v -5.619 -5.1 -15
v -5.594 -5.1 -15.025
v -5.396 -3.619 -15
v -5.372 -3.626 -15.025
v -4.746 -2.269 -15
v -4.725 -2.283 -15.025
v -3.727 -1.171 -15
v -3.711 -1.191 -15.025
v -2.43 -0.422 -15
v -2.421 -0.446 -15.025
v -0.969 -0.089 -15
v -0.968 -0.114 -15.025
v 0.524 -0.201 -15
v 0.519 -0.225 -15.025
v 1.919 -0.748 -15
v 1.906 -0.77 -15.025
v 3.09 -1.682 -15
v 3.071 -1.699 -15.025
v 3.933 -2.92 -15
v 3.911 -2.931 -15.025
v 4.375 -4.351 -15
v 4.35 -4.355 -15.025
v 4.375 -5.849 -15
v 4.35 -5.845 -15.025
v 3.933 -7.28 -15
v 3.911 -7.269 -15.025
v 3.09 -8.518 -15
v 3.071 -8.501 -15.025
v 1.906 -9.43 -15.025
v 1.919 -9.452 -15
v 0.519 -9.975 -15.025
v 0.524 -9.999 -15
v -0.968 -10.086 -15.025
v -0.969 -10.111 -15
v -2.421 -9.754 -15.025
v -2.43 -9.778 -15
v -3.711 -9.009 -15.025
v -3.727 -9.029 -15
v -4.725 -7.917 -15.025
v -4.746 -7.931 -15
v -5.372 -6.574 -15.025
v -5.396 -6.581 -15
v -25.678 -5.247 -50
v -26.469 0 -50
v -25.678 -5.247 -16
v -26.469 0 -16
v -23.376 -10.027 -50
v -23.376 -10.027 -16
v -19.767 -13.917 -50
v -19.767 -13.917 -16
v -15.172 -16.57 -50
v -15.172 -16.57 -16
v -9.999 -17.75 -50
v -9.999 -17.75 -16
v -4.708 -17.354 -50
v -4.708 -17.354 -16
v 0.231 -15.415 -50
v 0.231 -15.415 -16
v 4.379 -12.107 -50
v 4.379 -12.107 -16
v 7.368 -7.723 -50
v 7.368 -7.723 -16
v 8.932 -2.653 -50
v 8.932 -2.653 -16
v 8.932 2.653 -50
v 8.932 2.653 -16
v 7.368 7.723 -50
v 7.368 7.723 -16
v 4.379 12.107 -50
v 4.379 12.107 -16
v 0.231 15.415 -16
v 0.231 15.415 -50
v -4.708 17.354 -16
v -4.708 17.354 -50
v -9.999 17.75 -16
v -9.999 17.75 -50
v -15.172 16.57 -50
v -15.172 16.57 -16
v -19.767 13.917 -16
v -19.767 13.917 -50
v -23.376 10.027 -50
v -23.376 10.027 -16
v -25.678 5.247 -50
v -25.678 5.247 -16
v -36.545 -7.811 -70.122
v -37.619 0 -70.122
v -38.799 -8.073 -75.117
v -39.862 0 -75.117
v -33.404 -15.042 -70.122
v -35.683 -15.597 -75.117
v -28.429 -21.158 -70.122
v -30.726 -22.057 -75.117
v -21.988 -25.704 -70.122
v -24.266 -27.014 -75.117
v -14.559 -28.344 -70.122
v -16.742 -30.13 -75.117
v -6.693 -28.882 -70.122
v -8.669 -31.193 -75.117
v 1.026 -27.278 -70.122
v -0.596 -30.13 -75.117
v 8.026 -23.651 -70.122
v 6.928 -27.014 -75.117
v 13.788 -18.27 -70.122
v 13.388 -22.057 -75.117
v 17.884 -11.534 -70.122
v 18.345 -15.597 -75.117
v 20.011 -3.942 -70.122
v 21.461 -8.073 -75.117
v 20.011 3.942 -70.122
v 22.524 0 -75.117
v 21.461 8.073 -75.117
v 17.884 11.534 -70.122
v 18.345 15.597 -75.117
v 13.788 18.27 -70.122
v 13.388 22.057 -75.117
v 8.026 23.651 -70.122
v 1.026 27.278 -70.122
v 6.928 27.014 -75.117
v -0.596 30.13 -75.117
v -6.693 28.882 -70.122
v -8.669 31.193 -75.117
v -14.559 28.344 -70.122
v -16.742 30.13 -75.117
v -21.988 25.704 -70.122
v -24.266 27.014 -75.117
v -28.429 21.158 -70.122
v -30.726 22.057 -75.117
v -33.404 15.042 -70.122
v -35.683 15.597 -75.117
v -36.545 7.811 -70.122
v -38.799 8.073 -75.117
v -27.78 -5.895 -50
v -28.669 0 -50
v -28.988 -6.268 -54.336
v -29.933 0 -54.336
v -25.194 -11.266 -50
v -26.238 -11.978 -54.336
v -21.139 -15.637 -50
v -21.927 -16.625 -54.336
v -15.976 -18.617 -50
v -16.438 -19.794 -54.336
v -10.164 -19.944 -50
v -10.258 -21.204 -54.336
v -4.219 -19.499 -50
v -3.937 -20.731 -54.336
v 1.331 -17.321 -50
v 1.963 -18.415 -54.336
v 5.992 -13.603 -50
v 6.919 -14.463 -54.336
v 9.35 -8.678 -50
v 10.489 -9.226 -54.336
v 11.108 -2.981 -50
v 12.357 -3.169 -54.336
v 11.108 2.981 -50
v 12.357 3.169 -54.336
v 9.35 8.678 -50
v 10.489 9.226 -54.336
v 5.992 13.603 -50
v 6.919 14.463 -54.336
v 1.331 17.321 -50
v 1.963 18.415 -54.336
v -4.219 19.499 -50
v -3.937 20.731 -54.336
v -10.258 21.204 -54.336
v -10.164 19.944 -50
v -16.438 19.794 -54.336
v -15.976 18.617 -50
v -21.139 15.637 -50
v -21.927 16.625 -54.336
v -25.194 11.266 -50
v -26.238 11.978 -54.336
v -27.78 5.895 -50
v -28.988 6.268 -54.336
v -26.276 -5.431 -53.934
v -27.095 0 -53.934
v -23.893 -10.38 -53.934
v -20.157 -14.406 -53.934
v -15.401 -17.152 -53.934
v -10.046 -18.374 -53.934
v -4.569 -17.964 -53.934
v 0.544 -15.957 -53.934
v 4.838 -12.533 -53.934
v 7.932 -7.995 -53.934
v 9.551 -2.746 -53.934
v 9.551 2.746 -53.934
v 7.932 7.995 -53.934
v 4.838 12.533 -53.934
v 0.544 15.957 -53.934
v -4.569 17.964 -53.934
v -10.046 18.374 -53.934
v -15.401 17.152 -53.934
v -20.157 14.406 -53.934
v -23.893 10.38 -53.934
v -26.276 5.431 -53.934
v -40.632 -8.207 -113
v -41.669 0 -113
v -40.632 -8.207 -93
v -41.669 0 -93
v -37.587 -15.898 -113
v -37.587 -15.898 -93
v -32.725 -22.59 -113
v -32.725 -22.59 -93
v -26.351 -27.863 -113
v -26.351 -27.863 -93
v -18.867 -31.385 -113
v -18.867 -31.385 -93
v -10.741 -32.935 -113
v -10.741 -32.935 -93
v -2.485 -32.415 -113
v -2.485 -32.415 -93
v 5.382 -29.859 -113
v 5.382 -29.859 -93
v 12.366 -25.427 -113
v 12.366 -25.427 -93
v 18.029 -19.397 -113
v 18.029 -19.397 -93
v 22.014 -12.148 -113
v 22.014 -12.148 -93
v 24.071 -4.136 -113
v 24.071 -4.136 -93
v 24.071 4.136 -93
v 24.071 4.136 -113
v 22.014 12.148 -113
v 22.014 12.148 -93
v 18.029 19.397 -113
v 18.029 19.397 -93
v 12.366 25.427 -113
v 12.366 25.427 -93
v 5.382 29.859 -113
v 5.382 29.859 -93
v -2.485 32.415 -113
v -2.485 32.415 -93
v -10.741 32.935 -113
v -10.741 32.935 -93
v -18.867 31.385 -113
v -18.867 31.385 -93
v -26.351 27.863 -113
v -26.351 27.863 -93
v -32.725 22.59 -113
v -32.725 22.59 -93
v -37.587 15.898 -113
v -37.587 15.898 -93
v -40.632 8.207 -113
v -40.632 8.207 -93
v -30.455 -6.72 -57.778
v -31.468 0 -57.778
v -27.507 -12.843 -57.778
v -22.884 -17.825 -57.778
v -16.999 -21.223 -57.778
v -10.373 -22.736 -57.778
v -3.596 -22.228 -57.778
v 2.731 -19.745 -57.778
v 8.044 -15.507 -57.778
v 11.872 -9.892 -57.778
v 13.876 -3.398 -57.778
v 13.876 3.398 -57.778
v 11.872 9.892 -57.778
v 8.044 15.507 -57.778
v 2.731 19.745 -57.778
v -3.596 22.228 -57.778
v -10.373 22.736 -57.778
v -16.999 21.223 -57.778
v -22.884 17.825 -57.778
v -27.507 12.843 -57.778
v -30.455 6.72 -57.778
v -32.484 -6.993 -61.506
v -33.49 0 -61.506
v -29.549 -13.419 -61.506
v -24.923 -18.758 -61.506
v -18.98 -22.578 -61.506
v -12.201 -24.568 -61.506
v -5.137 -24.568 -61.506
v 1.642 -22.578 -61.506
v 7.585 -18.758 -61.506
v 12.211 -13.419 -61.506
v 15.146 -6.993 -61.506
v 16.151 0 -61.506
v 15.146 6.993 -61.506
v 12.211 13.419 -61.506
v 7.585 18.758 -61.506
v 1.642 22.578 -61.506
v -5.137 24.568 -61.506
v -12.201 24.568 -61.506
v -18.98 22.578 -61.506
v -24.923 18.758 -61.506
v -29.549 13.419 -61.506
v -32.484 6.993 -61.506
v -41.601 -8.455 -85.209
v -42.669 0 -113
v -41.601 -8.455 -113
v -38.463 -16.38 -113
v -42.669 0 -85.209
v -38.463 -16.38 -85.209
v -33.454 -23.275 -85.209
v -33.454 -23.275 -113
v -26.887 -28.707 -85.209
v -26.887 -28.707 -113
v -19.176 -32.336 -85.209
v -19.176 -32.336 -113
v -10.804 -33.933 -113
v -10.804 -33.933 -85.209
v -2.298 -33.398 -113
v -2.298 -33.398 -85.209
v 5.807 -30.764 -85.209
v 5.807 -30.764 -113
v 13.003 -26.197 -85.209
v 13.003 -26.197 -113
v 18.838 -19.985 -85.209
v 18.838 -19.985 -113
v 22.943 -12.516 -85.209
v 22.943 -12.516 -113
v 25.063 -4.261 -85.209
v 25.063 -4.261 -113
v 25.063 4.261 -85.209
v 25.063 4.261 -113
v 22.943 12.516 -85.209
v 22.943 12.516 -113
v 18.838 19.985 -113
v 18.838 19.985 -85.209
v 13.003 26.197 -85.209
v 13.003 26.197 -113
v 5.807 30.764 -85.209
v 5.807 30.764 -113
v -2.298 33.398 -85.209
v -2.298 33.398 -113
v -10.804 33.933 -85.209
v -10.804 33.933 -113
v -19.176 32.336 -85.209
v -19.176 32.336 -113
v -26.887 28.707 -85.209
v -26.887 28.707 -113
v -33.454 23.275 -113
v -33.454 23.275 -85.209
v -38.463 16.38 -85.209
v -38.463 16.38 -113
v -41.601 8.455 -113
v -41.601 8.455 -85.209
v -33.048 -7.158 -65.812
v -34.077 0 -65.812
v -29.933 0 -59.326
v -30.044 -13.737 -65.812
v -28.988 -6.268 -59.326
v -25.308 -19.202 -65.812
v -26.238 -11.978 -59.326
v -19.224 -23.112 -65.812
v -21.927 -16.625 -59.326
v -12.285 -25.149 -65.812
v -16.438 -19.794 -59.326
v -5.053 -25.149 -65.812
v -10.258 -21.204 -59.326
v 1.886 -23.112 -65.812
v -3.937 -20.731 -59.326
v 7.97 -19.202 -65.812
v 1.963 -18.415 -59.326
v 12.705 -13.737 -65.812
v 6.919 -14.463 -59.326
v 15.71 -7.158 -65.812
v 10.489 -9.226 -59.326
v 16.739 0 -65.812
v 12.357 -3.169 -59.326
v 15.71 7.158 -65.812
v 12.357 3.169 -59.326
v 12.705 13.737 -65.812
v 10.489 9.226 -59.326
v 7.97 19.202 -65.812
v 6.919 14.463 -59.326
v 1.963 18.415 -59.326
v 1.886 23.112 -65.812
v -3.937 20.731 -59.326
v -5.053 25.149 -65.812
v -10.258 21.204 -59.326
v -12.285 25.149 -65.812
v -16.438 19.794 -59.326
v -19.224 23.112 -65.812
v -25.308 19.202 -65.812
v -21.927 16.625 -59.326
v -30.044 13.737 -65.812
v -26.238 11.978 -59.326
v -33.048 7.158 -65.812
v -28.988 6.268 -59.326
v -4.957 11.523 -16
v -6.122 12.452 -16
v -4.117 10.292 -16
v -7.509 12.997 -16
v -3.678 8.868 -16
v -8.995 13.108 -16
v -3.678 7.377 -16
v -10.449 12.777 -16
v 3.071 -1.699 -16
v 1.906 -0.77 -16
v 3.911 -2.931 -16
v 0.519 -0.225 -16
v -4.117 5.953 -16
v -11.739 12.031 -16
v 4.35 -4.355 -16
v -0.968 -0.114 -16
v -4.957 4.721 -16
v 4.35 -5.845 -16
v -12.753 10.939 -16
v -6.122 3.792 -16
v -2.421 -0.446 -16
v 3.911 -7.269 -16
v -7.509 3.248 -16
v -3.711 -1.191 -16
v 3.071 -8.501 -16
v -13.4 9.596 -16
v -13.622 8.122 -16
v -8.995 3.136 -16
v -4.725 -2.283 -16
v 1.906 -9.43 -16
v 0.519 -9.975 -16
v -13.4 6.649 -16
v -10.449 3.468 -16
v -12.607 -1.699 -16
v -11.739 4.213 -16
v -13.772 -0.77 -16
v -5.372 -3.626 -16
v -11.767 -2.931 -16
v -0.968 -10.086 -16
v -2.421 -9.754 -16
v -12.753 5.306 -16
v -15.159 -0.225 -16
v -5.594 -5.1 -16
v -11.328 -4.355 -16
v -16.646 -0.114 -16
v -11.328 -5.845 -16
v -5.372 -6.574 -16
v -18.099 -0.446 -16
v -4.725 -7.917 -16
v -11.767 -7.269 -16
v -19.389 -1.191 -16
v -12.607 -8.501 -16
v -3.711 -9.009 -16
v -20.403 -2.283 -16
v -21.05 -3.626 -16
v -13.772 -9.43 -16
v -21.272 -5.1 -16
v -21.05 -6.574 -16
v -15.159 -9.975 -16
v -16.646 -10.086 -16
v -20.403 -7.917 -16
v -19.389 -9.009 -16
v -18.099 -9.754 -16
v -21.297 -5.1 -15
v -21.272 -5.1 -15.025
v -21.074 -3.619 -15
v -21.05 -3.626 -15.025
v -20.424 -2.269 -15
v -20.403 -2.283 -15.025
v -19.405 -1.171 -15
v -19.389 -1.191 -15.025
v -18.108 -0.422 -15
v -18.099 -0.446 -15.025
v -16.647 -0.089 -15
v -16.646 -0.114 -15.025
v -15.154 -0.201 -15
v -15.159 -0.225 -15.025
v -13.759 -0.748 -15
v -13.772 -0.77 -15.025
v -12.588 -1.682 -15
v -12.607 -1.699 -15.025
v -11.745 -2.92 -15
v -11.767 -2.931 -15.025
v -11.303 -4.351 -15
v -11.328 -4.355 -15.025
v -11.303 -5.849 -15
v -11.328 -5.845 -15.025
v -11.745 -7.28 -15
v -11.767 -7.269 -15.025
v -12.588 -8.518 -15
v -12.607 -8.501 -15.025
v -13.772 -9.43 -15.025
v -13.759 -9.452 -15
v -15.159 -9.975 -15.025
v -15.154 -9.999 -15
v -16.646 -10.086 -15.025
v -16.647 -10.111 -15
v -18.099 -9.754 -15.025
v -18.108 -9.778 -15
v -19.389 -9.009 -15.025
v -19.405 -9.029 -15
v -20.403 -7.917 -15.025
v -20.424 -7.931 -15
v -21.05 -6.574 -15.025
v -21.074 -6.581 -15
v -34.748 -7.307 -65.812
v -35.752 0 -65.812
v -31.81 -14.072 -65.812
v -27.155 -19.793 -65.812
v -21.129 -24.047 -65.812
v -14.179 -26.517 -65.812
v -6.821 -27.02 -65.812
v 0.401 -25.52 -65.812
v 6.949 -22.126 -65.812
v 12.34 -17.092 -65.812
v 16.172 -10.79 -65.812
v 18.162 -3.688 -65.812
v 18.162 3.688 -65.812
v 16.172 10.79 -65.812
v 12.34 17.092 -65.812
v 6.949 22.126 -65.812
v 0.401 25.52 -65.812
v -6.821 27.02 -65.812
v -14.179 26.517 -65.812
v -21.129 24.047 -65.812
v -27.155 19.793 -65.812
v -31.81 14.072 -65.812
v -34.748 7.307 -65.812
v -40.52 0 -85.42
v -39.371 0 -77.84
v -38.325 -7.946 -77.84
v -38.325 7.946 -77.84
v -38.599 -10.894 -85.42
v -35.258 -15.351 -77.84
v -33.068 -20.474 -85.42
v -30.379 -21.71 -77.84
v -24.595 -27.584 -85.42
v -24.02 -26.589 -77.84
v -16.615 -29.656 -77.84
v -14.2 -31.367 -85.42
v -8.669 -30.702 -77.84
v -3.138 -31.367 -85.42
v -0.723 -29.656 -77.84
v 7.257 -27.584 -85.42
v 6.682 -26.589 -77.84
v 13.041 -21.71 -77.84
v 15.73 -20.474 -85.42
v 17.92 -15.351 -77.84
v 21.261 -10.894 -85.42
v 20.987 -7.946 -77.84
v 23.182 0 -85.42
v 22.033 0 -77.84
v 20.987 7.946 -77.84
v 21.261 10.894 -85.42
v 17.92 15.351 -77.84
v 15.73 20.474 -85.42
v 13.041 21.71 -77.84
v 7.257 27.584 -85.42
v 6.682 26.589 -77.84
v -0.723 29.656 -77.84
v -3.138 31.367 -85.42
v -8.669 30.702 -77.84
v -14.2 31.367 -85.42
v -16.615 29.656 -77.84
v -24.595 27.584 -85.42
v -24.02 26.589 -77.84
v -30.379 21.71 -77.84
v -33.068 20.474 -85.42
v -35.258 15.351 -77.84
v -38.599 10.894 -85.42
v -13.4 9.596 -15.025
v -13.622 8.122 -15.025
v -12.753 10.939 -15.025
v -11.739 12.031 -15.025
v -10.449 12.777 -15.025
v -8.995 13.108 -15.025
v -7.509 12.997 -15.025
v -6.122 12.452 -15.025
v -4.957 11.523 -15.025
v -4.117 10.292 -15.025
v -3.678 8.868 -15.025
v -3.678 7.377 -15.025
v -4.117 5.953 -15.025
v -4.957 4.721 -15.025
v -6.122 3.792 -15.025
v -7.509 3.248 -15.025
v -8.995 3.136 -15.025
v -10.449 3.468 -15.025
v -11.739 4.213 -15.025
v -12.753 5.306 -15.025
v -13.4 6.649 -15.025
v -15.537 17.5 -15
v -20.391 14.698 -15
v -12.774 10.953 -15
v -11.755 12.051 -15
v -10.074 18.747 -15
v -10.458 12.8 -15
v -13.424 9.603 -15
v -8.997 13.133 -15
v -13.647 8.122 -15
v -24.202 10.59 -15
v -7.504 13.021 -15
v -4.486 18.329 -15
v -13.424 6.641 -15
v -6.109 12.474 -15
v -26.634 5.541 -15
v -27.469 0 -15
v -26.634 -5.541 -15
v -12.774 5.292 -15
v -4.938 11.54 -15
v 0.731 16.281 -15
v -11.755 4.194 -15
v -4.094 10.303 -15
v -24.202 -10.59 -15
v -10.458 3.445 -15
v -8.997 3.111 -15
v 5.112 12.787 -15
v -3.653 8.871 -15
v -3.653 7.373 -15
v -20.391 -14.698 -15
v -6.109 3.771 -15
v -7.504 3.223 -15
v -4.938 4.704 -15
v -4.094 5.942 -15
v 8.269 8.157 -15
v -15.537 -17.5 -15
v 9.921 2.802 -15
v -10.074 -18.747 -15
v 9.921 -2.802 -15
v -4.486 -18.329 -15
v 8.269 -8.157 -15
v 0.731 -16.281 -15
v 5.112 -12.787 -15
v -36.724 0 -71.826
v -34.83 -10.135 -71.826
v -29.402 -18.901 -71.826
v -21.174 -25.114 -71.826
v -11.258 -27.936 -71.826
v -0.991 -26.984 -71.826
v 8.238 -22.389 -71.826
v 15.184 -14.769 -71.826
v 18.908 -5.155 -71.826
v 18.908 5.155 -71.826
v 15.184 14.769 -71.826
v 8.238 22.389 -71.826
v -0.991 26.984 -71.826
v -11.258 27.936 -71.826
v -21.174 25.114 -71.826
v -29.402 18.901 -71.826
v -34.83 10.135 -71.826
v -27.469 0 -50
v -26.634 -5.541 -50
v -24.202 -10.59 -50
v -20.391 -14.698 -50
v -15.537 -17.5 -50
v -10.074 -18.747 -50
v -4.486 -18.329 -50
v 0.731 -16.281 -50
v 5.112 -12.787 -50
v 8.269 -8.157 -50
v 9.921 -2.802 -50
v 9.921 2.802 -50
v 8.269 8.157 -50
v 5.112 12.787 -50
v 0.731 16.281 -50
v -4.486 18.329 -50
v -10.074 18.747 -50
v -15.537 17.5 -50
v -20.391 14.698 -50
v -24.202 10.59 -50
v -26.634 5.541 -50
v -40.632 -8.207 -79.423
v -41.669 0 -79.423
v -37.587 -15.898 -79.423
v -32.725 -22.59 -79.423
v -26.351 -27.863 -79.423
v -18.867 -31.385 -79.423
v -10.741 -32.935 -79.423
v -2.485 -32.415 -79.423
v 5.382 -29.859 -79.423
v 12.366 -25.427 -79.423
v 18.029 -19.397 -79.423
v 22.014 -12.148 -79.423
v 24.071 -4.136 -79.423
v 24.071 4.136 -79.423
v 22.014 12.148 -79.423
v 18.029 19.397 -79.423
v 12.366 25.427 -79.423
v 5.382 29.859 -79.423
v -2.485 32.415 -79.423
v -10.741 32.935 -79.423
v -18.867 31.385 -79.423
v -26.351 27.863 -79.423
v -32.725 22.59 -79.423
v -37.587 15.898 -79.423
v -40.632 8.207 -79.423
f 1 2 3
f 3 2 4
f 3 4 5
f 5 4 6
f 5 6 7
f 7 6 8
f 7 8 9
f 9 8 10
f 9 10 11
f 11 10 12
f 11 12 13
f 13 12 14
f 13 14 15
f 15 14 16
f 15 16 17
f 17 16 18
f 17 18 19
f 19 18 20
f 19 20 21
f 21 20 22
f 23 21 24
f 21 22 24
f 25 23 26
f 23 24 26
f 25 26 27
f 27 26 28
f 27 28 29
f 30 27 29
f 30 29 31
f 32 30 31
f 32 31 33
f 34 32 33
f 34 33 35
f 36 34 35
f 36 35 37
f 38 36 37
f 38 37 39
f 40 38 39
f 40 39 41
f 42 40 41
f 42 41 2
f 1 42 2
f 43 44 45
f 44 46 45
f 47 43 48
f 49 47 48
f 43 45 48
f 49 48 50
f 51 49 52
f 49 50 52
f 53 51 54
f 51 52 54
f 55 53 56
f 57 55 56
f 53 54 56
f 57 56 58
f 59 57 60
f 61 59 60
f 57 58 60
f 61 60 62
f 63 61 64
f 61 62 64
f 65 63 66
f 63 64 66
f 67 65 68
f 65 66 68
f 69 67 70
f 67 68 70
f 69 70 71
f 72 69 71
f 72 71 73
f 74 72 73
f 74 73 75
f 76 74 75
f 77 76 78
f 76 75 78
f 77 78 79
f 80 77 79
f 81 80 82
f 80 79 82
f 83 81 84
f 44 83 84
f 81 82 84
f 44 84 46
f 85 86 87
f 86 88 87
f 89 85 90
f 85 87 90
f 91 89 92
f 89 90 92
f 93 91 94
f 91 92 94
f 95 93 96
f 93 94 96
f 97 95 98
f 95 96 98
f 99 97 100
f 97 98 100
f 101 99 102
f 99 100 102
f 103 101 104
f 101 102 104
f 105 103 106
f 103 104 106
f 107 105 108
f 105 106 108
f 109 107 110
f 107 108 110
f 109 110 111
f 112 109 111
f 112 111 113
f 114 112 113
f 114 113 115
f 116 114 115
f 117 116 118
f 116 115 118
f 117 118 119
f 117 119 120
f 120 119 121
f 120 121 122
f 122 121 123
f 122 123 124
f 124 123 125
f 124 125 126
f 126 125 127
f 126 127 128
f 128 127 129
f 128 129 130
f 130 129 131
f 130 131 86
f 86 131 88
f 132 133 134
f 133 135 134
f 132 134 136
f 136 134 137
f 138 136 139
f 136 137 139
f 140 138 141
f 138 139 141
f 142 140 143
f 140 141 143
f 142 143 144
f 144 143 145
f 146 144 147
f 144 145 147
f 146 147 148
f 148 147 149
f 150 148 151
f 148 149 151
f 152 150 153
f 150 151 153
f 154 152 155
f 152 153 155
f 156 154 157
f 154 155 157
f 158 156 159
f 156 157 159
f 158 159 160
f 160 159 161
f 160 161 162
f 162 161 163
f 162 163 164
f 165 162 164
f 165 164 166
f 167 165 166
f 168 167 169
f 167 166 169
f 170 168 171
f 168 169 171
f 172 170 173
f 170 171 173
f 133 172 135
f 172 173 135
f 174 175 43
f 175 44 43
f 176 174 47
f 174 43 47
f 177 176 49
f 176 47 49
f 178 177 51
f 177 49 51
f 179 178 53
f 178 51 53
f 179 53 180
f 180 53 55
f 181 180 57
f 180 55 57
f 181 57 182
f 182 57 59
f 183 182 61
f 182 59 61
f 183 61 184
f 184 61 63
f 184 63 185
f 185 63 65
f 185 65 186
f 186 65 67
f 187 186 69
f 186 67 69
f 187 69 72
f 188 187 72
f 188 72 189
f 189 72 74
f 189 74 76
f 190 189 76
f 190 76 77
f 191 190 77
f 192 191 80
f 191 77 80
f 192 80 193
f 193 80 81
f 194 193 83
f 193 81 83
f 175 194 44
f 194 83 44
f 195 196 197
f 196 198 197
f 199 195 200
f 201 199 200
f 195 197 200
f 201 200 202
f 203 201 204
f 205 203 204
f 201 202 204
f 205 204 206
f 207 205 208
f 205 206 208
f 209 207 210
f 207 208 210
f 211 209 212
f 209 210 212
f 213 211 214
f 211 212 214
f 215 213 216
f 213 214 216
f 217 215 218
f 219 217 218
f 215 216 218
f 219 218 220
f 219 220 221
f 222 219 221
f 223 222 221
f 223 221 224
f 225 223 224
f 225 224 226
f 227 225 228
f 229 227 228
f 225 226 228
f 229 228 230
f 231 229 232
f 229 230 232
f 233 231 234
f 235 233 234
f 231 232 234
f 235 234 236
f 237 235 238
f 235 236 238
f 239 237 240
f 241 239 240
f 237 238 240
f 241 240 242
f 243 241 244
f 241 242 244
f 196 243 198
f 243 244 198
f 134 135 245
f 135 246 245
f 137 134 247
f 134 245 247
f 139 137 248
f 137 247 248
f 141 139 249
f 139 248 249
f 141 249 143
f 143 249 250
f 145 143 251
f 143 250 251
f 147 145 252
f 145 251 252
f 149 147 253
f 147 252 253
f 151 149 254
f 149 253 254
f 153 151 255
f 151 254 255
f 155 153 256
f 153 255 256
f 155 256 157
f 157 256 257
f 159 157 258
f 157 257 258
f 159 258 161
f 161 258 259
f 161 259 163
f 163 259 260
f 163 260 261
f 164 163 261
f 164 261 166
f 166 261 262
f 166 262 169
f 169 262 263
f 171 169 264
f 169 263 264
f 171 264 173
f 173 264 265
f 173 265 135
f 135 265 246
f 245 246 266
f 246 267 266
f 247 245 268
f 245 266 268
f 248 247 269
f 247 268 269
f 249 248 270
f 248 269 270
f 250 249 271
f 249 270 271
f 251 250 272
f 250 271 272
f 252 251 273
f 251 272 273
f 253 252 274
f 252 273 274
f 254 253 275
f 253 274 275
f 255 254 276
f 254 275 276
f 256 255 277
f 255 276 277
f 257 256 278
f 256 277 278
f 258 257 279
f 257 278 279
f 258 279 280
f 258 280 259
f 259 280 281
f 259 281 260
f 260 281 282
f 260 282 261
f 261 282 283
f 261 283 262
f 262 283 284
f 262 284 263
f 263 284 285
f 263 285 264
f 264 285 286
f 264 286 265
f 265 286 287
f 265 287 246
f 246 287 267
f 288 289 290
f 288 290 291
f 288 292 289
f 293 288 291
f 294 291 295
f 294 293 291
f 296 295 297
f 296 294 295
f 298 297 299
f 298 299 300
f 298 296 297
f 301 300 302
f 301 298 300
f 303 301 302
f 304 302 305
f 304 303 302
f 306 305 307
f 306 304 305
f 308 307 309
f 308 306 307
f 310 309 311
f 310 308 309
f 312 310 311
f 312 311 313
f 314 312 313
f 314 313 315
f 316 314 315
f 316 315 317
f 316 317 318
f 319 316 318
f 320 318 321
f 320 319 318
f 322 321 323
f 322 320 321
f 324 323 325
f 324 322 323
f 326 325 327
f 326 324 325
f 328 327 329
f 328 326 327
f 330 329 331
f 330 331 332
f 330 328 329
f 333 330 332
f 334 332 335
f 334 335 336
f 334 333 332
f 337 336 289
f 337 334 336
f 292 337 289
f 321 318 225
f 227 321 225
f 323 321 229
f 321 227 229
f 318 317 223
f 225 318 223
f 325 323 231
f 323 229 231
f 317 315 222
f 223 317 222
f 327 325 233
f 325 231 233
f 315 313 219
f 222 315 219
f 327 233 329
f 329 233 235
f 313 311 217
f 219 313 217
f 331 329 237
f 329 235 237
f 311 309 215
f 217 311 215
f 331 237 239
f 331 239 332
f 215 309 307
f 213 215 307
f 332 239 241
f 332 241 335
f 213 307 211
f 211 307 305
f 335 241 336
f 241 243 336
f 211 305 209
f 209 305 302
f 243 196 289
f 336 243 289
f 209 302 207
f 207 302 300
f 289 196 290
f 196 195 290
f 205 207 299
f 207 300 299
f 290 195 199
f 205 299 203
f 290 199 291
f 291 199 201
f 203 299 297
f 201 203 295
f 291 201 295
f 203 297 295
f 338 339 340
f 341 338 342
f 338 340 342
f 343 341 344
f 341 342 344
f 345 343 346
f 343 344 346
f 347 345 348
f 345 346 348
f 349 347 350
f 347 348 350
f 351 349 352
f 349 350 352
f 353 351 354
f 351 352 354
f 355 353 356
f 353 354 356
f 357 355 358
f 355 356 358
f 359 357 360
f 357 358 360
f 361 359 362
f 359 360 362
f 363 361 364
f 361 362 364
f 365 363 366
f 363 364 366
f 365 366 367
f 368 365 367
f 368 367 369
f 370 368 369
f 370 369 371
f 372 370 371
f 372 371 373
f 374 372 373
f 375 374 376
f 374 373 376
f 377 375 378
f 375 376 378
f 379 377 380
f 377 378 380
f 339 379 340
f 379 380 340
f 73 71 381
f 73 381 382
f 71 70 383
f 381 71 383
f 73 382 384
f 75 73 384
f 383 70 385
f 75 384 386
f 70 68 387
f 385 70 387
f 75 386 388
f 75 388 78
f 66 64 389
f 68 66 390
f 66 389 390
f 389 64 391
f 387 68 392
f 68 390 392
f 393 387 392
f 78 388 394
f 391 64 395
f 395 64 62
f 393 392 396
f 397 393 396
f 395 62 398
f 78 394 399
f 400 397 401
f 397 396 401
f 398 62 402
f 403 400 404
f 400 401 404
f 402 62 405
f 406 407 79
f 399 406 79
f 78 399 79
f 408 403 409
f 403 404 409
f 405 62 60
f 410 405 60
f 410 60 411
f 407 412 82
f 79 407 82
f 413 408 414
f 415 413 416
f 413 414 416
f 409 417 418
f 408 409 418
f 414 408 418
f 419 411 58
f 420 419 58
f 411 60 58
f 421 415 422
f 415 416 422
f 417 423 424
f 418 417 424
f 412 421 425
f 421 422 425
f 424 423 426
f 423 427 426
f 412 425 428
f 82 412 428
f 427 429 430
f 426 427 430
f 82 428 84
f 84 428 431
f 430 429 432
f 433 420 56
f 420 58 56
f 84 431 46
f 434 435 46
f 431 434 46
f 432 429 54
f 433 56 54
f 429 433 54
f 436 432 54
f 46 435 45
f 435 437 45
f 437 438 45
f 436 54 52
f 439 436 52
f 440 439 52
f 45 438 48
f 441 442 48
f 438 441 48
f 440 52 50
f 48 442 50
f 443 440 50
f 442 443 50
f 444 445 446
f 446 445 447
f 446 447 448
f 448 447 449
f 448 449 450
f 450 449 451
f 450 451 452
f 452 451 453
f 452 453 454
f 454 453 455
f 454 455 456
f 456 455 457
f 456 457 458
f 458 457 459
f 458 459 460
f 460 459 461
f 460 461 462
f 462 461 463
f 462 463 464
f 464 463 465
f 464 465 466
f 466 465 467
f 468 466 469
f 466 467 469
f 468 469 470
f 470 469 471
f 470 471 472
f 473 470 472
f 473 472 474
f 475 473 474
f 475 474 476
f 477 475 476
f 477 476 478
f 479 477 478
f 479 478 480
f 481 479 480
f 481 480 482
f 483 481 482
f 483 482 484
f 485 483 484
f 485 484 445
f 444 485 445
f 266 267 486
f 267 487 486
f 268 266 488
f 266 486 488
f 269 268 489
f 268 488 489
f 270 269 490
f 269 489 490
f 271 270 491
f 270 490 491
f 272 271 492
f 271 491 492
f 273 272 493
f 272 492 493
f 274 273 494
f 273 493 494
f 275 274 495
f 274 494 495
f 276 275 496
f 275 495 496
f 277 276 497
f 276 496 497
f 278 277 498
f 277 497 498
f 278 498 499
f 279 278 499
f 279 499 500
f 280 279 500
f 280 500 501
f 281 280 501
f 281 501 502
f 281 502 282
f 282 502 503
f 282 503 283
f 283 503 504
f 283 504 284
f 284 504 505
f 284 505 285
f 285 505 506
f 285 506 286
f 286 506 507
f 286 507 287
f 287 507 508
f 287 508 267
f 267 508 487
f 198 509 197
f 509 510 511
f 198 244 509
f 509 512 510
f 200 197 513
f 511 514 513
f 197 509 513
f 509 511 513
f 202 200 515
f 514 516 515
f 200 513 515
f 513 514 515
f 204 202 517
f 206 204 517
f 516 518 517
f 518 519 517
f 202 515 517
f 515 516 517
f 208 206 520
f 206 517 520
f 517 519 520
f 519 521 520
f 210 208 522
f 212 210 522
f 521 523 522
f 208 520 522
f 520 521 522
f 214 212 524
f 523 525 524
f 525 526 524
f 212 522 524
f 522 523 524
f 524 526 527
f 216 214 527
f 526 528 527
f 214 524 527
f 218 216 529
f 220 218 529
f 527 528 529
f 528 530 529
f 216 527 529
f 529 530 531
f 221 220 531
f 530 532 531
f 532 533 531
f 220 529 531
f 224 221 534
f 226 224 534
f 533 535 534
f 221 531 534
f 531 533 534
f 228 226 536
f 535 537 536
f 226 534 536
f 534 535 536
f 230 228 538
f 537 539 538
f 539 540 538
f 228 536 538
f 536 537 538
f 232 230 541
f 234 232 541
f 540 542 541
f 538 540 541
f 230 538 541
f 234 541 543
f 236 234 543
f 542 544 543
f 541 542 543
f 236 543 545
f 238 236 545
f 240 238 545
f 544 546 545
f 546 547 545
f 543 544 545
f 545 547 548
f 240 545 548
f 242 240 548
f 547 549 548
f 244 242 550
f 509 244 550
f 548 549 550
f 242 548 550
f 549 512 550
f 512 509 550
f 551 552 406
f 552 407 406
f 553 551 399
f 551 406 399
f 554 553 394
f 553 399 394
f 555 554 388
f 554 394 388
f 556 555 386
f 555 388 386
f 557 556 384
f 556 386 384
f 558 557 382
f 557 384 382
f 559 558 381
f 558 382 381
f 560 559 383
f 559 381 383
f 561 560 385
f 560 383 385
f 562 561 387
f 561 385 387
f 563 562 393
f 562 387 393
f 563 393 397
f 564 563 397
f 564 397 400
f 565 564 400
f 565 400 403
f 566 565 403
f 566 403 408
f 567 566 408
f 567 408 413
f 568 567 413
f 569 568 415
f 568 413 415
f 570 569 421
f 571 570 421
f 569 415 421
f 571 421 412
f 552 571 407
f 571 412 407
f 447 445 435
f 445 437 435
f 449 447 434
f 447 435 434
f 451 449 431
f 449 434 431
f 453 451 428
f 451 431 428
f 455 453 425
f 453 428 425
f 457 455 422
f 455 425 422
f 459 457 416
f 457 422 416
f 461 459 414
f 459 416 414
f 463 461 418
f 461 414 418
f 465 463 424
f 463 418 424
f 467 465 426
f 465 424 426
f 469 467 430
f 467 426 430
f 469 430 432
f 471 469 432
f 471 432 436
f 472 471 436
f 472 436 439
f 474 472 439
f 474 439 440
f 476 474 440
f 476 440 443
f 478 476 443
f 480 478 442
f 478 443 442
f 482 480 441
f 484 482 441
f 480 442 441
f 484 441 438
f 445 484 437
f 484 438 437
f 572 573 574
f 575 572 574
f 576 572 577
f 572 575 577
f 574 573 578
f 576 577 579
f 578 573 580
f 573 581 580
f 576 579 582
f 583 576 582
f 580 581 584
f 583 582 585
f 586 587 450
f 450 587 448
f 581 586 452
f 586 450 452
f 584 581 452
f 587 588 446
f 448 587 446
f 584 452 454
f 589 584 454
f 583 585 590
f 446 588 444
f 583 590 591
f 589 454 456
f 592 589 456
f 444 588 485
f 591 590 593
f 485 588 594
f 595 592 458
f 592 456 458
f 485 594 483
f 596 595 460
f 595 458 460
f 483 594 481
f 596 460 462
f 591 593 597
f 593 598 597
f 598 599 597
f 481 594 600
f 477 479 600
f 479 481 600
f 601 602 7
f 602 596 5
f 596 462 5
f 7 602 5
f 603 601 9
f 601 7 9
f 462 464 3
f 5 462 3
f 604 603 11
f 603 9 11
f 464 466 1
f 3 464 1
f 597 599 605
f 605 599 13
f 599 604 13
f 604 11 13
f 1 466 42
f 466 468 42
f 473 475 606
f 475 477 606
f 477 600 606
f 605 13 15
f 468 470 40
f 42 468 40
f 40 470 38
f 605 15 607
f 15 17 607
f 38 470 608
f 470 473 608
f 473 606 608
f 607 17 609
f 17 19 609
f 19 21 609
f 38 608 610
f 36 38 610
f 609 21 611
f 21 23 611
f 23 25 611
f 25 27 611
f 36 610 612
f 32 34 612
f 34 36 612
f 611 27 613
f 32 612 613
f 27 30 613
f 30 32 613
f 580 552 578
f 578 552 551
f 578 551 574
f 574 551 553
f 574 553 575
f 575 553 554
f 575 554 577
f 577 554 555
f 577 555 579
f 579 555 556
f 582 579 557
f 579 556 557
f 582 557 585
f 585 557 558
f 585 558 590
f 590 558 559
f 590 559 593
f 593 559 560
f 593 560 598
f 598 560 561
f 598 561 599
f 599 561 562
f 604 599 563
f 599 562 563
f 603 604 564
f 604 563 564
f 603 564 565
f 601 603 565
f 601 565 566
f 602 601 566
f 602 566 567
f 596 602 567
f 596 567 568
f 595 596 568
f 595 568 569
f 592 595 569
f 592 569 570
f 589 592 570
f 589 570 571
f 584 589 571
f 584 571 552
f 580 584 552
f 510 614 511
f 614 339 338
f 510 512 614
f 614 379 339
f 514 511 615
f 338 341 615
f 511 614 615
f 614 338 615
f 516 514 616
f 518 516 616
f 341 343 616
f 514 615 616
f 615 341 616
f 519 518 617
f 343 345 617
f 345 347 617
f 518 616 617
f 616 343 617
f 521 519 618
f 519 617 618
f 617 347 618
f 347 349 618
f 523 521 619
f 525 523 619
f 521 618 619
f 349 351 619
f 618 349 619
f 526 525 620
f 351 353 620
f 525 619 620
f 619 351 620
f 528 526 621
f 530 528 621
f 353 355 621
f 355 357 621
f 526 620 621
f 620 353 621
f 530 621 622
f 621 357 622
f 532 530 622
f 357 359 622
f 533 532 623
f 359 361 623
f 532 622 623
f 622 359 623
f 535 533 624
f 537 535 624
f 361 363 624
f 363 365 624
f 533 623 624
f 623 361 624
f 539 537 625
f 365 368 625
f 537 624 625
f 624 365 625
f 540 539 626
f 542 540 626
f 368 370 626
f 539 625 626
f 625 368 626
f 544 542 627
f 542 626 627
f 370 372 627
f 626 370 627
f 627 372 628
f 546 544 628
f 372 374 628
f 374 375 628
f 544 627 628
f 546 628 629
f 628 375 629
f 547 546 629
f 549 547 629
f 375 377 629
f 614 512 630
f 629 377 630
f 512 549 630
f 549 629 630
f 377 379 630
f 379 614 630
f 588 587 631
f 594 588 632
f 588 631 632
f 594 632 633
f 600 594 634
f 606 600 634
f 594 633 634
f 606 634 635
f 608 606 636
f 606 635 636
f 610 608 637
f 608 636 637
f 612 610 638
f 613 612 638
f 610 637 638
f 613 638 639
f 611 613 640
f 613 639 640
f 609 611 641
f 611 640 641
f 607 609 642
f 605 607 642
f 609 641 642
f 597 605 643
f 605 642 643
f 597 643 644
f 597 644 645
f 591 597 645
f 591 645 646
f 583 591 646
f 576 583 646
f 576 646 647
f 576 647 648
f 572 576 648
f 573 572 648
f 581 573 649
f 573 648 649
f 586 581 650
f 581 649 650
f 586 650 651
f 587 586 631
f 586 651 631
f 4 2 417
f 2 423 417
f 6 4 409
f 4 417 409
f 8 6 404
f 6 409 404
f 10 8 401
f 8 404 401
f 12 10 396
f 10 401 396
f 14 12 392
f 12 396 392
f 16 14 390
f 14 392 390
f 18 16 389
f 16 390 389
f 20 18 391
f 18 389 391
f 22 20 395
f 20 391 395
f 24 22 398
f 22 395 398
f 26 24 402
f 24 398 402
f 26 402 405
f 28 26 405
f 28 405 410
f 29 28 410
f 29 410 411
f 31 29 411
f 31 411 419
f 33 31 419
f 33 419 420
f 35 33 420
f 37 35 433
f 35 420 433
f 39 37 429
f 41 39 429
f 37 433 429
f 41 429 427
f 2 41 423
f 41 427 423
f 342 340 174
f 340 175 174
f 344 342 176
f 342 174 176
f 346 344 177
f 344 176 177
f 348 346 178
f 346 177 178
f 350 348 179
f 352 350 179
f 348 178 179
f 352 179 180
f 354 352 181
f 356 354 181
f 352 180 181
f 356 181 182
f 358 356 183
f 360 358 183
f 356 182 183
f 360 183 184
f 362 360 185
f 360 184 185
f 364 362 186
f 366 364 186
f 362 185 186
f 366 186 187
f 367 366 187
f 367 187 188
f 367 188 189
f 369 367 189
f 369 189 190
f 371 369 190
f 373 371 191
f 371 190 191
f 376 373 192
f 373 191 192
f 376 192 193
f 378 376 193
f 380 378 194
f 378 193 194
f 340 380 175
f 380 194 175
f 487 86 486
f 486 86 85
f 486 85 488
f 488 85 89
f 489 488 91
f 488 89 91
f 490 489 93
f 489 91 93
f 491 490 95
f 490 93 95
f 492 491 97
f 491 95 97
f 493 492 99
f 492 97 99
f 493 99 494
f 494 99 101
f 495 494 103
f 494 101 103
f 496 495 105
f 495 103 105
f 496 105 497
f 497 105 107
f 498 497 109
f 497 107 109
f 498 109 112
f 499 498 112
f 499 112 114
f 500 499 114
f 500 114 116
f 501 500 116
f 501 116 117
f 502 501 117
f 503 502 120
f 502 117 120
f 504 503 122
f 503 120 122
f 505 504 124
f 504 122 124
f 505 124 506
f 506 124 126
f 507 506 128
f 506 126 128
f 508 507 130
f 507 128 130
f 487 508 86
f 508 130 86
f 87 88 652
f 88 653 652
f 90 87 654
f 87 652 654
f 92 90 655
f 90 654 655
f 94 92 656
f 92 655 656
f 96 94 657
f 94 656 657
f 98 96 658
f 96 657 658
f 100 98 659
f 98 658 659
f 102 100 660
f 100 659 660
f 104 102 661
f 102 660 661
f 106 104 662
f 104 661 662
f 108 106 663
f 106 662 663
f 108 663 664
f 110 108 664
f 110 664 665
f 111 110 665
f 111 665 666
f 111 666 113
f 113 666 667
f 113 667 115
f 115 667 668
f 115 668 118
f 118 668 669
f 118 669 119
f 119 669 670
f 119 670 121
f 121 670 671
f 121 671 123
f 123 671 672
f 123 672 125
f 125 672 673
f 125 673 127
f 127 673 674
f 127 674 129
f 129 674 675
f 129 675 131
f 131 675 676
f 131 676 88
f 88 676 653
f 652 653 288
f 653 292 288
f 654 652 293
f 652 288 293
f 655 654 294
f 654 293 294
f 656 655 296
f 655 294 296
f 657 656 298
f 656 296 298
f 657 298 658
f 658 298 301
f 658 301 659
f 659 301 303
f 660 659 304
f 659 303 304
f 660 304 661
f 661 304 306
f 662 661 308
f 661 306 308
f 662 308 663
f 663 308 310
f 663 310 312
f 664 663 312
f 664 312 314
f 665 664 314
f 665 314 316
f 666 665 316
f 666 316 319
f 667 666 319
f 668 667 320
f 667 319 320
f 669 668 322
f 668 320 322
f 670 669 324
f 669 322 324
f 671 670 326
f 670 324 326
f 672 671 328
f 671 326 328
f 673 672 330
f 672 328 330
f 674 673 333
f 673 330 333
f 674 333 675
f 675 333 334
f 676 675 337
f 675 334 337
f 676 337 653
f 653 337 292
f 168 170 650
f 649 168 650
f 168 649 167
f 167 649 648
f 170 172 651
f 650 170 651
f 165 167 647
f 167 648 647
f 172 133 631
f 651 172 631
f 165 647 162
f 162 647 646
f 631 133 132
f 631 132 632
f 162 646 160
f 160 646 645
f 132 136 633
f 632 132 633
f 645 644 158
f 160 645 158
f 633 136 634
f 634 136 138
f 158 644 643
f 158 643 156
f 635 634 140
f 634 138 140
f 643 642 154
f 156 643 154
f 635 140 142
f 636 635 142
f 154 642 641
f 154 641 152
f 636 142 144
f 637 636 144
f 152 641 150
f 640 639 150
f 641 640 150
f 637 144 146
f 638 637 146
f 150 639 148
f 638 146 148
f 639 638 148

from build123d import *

# Parameters (mm, degrees)
F_10_0MM_DOWEL_HOLE1_D           = 10
F_10_0MM_DOWEL_HOLE1_CSINK_D     = 10.05
F_10_0MM_DOWEL_HOLE1_CSINK_ANGLE = 90


with BuildPart() as part:
    # ff → Revolve1 (revolve)
    with BuildSketch(Plane(origin=(0, 0, 0), x_dir=(1, 0, 0), z_dir=(0, 1, 0))):
        Polygon((-27.469034289, 50), (-28.669034289, 50), (-29.932925511, 54.335656855), (-31.468331613, 57.777529323), (-33.489527061, 61.506224497), (-35.752379109, 65.81164745), (-37.618887017, 70.122472229), (-39.86237248, 75.117178167), (-41.669034289, 79.422637332), (-42.669034289, 85.208855182), (-42.669034289, 90.333303824), (-42.669034289, 93), (-42.669034289, 113), (-41.669034289, 113), (-41.669034289, 93), (-39.371495413, 77.8398126), (-34.076931722, 65.81164745), (-29.932925511, 59.326371933), (-27.094890318, 53.934105067), (-26.469034289, 50), (-26.469034289, 16), (-8.669034289, 16), (-8.669034289, 15), (-27.469034289, 15), align=None)
    revolve(axis=Axis((-8.669034289, 0, -16), (0, 0, 1)))

    # Ø10.0mm Dowel Hole1 (through all)
    with Locations(Plane.XY.offset(-15)):
        with Locations((-8.62181152, 8.122316285), (-16.271900114, -5.100059063), (-0.593940773, -5.100059063)):
            CounterSinkHole(F_10_0MM_DOWEL_HOLE1_D / 2, F_10_0MM_DOWEL_HOLE1_CSINK_D / 2, counter_sink_angle=F_10_0MM_DOWEL_HOLE1_CSINK_ANGLE)


solid = part.part
